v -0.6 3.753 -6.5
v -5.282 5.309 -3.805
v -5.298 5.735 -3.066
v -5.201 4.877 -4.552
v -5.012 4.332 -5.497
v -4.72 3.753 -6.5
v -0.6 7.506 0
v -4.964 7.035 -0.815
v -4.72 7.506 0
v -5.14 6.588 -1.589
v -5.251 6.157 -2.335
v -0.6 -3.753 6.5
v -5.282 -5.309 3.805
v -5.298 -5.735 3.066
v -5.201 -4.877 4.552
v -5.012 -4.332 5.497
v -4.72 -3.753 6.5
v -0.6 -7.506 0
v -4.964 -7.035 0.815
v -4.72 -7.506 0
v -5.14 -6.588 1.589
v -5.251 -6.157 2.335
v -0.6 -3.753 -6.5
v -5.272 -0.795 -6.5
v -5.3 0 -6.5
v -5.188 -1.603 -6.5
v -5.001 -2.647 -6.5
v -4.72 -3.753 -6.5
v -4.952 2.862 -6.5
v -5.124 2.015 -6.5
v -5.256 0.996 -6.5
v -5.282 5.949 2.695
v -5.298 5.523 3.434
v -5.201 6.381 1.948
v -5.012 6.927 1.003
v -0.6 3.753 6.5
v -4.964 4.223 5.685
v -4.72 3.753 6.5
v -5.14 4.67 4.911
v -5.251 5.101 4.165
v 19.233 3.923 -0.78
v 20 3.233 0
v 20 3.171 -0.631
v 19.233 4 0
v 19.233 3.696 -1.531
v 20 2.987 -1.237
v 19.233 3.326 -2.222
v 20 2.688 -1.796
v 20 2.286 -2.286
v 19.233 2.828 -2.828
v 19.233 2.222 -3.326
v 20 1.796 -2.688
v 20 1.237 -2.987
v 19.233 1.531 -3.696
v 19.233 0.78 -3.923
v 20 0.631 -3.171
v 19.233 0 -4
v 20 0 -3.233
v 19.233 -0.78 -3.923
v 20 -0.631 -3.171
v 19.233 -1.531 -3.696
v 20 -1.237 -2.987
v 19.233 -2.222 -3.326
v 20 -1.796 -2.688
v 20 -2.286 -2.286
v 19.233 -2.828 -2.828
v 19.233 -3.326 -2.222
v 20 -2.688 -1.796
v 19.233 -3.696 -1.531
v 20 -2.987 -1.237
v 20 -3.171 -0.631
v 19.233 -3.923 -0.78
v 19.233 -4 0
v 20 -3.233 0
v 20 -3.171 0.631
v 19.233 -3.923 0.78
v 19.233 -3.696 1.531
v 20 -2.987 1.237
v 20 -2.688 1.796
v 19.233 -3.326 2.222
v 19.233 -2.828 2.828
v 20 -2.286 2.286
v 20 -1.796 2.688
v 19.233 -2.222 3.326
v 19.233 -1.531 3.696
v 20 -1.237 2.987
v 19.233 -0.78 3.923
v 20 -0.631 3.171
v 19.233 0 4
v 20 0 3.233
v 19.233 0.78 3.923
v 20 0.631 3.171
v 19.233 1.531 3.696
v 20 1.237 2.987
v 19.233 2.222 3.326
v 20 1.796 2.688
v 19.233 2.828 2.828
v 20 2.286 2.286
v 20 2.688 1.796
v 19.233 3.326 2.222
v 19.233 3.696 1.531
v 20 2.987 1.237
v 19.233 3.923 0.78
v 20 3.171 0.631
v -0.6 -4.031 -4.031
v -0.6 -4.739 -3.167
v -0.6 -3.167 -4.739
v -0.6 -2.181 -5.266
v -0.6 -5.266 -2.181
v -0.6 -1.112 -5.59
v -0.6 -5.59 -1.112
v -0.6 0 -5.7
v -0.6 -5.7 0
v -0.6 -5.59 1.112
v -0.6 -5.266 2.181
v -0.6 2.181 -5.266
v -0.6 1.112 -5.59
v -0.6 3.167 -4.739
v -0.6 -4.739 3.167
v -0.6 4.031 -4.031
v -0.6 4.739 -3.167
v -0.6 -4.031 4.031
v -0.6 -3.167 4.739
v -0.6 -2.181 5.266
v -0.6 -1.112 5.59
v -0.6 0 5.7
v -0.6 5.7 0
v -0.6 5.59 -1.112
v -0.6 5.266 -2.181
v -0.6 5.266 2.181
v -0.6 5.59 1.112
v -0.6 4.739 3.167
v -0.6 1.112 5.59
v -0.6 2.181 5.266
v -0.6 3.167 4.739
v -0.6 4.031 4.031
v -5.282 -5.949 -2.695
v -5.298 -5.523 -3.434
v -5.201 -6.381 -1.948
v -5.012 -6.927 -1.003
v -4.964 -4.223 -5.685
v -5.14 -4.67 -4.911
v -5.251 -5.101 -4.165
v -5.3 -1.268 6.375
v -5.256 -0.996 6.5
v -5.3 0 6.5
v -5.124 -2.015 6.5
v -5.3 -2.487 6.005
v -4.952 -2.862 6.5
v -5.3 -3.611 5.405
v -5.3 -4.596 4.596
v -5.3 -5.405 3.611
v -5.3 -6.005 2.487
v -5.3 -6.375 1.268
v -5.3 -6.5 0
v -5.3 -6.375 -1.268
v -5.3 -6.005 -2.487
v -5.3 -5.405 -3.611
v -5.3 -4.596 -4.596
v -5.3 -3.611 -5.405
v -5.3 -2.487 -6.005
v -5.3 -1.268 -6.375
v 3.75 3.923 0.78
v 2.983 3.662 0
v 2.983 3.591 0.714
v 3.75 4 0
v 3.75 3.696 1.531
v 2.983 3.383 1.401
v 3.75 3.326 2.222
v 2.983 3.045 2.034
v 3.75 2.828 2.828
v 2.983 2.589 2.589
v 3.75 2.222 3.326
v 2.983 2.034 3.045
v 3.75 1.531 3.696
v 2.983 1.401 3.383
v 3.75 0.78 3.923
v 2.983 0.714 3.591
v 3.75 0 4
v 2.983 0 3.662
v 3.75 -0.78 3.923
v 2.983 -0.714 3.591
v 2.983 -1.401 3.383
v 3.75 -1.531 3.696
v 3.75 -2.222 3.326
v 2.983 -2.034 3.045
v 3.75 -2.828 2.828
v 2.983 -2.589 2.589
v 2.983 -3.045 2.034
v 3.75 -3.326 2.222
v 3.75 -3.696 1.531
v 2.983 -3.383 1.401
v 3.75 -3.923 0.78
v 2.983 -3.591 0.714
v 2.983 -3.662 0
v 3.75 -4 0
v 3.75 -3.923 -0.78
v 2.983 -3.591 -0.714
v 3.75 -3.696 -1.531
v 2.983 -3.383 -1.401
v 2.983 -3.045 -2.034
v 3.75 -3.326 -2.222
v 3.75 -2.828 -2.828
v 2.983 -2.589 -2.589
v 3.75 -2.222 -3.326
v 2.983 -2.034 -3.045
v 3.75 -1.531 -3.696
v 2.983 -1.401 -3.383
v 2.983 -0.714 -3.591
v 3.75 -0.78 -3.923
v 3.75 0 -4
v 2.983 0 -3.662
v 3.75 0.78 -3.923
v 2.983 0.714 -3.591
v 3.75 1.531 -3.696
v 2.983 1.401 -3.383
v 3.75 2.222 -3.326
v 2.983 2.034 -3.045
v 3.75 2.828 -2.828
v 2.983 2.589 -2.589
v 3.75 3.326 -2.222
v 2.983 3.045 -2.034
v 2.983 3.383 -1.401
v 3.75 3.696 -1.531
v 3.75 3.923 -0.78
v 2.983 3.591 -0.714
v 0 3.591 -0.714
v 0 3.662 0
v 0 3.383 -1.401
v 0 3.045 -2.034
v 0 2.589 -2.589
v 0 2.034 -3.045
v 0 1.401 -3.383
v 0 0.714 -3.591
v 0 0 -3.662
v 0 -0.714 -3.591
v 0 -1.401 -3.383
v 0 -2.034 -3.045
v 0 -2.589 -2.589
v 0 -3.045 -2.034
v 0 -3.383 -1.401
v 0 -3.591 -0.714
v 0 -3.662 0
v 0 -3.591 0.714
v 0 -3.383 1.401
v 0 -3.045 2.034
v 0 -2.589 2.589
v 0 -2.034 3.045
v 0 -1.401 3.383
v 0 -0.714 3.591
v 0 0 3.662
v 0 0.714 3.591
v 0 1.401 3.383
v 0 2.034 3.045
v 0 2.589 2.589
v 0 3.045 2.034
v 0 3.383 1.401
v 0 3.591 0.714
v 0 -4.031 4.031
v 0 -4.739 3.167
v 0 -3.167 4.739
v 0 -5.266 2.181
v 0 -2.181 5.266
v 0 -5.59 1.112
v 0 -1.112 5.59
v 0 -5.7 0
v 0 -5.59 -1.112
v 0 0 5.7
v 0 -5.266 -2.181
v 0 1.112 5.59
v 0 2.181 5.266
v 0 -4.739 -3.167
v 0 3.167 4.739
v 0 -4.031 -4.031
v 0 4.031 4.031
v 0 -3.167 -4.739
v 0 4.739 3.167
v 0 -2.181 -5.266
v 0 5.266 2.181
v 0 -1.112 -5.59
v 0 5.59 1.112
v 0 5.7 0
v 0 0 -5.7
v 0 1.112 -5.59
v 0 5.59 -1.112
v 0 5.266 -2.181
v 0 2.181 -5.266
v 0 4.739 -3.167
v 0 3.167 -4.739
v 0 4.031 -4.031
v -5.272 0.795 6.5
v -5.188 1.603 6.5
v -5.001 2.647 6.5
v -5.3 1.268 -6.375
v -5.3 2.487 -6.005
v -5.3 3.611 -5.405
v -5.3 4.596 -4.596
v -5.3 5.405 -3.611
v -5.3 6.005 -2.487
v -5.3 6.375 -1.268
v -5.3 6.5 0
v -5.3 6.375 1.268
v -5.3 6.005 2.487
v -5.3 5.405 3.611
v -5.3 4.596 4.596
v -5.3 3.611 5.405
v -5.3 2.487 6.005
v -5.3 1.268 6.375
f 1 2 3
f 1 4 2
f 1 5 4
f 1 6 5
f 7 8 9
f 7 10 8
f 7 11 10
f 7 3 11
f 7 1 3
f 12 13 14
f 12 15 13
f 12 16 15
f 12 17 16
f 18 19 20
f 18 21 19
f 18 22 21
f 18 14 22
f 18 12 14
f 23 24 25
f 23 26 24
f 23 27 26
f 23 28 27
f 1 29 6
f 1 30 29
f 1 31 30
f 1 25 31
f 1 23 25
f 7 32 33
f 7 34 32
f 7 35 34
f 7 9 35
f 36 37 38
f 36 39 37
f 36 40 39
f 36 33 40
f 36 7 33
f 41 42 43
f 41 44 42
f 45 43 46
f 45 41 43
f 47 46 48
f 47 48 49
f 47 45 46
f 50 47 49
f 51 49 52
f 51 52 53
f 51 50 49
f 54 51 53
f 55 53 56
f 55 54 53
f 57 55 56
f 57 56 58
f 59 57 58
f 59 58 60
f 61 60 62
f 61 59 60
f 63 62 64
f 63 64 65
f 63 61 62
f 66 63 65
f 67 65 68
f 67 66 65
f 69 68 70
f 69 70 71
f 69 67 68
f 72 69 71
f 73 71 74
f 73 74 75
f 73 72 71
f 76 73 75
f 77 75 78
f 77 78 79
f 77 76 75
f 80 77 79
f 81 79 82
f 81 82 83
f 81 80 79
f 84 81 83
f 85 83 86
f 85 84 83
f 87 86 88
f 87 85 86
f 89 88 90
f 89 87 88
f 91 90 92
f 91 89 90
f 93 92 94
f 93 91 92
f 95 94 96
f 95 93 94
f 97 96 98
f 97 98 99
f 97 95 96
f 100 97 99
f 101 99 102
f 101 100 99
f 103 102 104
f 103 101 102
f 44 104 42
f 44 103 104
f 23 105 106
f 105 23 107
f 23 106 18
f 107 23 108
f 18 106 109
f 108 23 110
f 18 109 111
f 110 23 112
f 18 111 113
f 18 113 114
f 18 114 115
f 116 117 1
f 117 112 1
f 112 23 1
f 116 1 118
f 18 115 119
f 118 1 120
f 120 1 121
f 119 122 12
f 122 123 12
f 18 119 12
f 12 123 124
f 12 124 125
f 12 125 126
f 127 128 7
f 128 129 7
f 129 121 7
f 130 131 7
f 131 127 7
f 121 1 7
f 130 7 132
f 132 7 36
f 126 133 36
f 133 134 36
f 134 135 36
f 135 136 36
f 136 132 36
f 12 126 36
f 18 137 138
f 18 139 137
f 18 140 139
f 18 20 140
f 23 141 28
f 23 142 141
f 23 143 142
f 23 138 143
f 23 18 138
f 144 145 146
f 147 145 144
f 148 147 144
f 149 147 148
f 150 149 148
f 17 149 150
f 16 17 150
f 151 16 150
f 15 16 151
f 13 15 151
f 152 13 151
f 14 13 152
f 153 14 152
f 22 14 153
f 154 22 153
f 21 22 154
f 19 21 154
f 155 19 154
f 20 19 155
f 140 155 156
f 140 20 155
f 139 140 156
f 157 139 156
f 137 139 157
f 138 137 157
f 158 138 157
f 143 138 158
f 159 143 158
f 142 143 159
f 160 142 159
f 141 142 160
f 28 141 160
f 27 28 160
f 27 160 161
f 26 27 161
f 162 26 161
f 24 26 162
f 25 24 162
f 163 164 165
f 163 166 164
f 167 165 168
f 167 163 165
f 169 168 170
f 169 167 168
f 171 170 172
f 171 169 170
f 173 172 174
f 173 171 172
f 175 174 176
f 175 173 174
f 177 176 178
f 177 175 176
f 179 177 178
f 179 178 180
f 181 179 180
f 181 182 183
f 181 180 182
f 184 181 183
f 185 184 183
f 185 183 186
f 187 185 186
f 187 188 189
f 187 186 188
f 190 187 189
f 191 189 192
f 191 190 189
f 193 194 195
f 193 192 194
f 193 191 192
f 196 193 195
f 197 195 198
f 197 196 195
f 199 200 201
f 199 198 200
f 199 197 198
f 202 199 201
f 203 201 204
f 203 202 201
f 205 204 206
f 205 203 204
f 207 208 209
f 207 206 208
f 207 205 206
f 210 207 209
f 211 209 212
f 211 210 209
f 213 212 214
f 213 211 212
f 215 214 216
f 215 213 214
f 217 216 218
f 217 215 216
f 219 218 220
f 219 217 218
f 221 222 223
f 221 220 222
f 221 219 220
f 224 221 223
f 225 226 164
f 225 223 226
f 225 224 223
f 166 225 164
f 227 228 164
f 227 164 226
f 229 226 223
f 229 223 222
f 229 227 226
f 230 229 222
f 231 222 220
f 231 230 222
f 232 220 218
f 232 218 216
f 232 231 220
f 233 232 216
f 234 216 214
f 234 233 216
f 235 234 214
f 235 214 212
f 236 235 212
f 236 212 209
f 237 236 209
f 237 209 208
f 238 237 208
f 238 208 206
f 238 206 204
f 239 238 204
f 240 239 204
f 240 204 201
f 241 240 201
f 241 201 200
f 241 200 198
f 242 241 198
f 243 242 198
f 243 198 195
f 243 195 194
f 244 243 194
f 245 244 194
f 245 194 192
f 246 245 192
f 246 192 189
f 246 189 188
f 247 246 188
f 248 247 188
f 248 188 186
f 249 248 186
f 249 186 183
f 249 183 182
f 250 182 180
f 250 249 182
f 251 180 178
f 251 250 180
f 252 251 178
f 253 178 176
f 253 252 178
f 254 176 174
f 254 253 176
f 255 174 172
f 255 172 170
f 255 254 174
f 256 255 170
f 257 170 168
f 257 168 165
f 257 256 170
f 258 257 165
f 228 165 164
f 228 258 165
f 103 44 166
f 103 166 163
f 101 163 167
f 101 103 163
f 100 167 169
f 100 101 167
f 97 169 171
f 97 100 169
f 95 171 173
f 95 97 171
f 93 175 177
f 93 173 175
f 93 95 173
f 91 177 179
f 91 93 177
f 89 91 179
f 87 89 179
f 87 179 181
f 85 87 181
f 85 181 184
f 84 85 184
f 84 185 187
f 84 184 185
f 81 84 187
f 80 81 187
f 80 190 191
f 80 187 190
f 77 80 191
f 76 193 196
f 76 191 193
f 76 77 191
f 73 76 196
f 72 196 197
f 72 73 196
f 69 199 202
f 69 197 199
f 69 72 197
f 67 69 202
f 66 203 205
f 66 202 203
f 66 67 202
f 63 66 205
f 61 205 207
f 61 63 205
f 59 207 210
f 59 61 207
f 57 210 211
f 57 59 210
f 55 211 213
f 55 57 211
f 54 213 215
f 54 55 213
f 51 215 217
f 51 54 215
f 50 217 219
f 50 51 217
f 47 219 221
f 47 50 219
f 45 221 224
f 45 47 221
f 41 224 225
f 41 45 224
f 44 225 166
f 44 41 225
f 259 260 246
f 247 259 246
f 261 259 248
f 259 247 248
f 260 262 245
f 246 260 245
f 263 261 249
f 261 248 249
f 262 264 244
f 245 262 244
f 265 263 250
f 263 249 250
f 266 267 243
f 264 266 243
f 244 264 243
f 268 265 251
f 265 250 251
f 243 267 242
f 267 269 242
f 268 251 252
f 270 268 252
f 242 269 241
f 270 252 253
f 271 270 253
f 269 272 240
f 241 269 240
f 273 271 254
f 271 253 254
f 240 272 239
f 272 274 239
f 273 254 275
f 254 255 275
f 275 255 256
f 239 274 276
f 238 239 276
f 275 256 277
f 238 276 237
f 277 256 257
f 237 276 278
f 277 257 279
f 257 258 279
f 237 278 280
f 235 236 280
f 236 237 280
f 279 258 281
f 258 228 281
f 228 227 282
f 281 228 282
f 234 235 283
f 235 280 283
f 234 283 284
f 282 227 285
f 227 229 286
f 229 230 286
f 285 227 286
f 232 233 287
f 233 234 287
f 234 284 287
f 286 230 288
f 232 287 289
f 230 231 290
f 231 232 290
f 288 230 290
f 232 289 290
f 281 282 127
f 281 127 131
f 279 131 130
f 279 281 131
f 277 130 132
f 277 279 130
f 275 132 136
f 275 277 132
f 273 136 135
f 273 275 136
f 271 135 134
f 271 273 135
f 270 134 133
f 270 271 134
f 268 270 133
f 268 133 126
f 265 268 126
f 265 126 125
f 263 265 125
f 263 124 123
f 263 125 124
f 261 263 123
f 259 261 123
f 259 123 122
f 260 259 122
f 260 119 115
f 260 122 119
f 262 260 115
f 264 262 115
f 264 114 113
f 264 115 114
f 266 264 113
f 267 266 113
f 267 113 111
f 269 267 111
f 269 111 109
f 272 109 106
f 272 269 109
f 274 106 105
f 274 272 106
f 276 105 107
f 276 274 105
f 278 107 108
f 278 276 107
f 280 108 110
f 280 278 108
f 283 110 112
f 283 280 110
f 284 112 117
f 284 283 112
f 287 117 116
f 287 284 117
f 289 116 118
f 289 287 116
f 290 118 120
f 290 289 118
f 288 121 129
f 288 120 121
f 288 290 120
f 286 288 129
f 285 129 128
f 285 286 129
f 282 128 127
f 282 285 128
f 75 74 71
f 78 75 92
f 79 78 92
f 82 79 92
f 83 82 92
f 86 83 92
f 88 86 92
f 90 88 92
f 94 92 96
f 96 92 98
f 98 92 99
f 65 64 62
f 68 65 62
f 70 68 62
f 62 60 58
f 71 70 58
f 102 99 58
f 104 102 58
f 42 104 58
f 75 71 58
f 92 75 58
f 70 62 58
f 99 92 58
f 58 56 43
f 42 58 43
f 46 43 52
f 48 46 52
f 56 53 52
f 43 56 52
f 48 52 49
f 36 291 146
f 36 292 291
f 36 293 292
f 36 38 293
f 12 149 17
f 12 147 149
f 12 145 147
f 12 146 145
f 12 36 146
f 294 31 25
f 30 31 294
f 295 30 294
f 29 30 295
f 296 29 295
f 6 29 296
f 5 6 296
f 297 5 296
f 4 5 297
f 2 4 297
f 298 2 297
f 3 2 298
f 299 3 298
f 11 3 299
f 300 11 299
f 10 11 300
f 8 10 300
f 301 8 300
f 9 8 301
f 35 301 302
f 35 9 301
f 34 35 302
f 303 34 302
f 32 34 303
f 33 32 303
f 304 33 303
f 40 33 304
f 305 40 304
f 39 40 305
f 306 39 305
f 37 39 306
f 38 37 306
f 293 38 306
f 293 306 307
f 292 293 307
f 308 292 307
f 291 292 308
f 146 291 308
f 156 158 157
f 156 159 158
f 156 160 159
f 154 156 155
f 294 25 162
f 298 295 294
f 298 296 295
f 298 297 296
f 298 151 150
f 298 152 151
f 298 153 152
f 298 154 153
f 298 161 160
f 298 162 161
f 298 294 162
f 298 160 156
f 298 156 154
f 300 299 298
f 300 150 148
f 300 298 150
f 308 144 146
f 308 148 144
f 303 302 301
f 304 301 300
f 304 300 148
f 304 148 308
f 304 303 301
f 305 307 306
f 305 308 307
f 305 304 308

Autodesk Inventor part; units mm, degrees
ref_plane "YZ Plane" through (0, 0, 0) normal (1, 0, 0) x (0, 1, 0)
ref_plane "XZ Plane" through (0, 0, 0) normal (0, 1, 0) x (-1, 0, 0)
sketch "Boceto1" plane through (0, 0, 0) normal (0, 0, 1) x (1, 0, 0)
  line L0 (0, 5.7) -> (0, 3.6617)
  line L1 (3.75, 4) -> (20, 4)
  line L2 (20, 4) -> (20, 0)
  line L3 (20, 0) -> (-0.6001, 0)
  line L4 (-0.7001, 0) -> (2.45, 0) projected
  line L5 (-0.6001, 0) -> (-0.6001, 5.7)
  line L6 (-0.6001, 5.7) -> (0, 5.7)
  line L7 (3.75, 4) -> (2.9831, 3.6617)
  line L8 (2.9831, 3.6617) -> (0, 3.6617)
  line L9 (0, -0.227) -> (0, 1.362) projected
  dimension "d0" = 20
  dimension "d1" = 16.25
  dimension "d2" = 8
  dimension "d9" = 0.6001
  dimension "d10" = 11.4
  dimension "d13" = 0.7669
  dimension "d14" = 7.3234
revolve "Cuerpo" add sketch "Boceto1" angle 360 about axis through (20, 0, 0) along (-1, 0, 0)
sketch "Boceto2" plane through (-0.6001, 0, 0) normal (-1, 0, 0) x (0, 0, 1)
  line L0 (0, 7.5056) -> (6.5, 3.7528)
  line L1 (6.5, 3.7528) -> (6.5, -3.7528)
  line L2 (6.5, -3.7528) -> (0, -7.5056)
  line L3 (0, -7.5056) -> (-6.5, -3.7528)
  line L4 (-6.5, -3.7528) -> (-6.5, 3.7528)
  line L5 (-6.5, 3.7528) -> (0, 7.5056)
  point P0 (0, 0)
  point P1 (0, 0)
  dimension "d11" = 13
extrude "Cabeza" add sketch "Boceto2" along normal blind 4.7
sketch "Boceto4" plane through (0, 0, 0) normal (0, 0, 1) x (1, 0, 0)
  line L0 (-5.3001, 6.5) -> (-5.3001, 7.5056)
  line L1 (-5.3001, 7.5056) -> (-4.7195, 7.5056)
  line L2 (-4.7195, 7.5056) -> (-5.3001, 6.5)
  line L3 (-1.2701, 0) -> (-0.0801, 0) projected
  line L4 (-0.6001, 7.5056) -> (-5.3001, 7.5056) projected
  line L5 (-5.3001, 3.7528) -> (-5.3001, 7.5056) projected
  dimension "d5" = 30
  dimension "d19" = 13
revolve "Chaflán1" cut sketch "Boceto4" angle 360 about axis through (-10, 0, 0) along (1, 0, 0)
thread "Rosca" size "M1.6x0.35" class "6g" standard "ANSI Metric M Profile" length 16.25
chamfer "Chaflán2" distance 0.7668 distance2 0.7669 1 edges at (20, -4, 0) measured on face at (20, 1.3194, 0.8842)
ref_plane "Work Plane1" through (1.525, 0, 0) normal (0, 0, 1) x (1, 0, 0)
equation "\"d0\" = NLG"
equation "\"d1\" = GEL"
equation "\"d2\" = GD"
equation "\"d10\" = SD2"
equation "\"d14\" = BDM"
equation "\"d11\" = SW"
equation "\"d3\" = KOH - SD"
equation "\"d5\" = ANG1"
equation "\"d19\" = SW0"
equation "\"d15\" = GEL"
equation "\"d6\" = -0.5 * SPD + 0.5 * GD"
equation "\"NLG\" = 20"
equation "\"GD\" = NND"
equation "\"BDM\" = 7.32342"
equation "\"KOH\" = 5.3"
equation "\"GEL\" = 16.25"
equation "\"SW\" = 13"
equation "\"SW0\" = 13"
equation "\"SPD\" = NND - 1.2269 * PTC"
equation "\"SD2\" = 11.4"
equation "\"SD\" = 0.6"
equation "\"ANG1\" = 30deg"
equation "\"GAL\" = 0.61345 * PTC"
equation "\"GUL\" = 0.61345 * PTC"
equation "\"RR\" = 0.4"
equation "\"GD1\" = THREADDIA - 1.2269 * PTC"
equation "\"THREADDIA\" = 8"
equation "\"TOA\" = 30deg"
equation "\"PTC\" = 1.25"
equation "\"NND\" = 8"
equation "\"E0\" = 1.155 * SW"
properties part number "DIN 933 - M8  x 20" material "Acero, suave"
